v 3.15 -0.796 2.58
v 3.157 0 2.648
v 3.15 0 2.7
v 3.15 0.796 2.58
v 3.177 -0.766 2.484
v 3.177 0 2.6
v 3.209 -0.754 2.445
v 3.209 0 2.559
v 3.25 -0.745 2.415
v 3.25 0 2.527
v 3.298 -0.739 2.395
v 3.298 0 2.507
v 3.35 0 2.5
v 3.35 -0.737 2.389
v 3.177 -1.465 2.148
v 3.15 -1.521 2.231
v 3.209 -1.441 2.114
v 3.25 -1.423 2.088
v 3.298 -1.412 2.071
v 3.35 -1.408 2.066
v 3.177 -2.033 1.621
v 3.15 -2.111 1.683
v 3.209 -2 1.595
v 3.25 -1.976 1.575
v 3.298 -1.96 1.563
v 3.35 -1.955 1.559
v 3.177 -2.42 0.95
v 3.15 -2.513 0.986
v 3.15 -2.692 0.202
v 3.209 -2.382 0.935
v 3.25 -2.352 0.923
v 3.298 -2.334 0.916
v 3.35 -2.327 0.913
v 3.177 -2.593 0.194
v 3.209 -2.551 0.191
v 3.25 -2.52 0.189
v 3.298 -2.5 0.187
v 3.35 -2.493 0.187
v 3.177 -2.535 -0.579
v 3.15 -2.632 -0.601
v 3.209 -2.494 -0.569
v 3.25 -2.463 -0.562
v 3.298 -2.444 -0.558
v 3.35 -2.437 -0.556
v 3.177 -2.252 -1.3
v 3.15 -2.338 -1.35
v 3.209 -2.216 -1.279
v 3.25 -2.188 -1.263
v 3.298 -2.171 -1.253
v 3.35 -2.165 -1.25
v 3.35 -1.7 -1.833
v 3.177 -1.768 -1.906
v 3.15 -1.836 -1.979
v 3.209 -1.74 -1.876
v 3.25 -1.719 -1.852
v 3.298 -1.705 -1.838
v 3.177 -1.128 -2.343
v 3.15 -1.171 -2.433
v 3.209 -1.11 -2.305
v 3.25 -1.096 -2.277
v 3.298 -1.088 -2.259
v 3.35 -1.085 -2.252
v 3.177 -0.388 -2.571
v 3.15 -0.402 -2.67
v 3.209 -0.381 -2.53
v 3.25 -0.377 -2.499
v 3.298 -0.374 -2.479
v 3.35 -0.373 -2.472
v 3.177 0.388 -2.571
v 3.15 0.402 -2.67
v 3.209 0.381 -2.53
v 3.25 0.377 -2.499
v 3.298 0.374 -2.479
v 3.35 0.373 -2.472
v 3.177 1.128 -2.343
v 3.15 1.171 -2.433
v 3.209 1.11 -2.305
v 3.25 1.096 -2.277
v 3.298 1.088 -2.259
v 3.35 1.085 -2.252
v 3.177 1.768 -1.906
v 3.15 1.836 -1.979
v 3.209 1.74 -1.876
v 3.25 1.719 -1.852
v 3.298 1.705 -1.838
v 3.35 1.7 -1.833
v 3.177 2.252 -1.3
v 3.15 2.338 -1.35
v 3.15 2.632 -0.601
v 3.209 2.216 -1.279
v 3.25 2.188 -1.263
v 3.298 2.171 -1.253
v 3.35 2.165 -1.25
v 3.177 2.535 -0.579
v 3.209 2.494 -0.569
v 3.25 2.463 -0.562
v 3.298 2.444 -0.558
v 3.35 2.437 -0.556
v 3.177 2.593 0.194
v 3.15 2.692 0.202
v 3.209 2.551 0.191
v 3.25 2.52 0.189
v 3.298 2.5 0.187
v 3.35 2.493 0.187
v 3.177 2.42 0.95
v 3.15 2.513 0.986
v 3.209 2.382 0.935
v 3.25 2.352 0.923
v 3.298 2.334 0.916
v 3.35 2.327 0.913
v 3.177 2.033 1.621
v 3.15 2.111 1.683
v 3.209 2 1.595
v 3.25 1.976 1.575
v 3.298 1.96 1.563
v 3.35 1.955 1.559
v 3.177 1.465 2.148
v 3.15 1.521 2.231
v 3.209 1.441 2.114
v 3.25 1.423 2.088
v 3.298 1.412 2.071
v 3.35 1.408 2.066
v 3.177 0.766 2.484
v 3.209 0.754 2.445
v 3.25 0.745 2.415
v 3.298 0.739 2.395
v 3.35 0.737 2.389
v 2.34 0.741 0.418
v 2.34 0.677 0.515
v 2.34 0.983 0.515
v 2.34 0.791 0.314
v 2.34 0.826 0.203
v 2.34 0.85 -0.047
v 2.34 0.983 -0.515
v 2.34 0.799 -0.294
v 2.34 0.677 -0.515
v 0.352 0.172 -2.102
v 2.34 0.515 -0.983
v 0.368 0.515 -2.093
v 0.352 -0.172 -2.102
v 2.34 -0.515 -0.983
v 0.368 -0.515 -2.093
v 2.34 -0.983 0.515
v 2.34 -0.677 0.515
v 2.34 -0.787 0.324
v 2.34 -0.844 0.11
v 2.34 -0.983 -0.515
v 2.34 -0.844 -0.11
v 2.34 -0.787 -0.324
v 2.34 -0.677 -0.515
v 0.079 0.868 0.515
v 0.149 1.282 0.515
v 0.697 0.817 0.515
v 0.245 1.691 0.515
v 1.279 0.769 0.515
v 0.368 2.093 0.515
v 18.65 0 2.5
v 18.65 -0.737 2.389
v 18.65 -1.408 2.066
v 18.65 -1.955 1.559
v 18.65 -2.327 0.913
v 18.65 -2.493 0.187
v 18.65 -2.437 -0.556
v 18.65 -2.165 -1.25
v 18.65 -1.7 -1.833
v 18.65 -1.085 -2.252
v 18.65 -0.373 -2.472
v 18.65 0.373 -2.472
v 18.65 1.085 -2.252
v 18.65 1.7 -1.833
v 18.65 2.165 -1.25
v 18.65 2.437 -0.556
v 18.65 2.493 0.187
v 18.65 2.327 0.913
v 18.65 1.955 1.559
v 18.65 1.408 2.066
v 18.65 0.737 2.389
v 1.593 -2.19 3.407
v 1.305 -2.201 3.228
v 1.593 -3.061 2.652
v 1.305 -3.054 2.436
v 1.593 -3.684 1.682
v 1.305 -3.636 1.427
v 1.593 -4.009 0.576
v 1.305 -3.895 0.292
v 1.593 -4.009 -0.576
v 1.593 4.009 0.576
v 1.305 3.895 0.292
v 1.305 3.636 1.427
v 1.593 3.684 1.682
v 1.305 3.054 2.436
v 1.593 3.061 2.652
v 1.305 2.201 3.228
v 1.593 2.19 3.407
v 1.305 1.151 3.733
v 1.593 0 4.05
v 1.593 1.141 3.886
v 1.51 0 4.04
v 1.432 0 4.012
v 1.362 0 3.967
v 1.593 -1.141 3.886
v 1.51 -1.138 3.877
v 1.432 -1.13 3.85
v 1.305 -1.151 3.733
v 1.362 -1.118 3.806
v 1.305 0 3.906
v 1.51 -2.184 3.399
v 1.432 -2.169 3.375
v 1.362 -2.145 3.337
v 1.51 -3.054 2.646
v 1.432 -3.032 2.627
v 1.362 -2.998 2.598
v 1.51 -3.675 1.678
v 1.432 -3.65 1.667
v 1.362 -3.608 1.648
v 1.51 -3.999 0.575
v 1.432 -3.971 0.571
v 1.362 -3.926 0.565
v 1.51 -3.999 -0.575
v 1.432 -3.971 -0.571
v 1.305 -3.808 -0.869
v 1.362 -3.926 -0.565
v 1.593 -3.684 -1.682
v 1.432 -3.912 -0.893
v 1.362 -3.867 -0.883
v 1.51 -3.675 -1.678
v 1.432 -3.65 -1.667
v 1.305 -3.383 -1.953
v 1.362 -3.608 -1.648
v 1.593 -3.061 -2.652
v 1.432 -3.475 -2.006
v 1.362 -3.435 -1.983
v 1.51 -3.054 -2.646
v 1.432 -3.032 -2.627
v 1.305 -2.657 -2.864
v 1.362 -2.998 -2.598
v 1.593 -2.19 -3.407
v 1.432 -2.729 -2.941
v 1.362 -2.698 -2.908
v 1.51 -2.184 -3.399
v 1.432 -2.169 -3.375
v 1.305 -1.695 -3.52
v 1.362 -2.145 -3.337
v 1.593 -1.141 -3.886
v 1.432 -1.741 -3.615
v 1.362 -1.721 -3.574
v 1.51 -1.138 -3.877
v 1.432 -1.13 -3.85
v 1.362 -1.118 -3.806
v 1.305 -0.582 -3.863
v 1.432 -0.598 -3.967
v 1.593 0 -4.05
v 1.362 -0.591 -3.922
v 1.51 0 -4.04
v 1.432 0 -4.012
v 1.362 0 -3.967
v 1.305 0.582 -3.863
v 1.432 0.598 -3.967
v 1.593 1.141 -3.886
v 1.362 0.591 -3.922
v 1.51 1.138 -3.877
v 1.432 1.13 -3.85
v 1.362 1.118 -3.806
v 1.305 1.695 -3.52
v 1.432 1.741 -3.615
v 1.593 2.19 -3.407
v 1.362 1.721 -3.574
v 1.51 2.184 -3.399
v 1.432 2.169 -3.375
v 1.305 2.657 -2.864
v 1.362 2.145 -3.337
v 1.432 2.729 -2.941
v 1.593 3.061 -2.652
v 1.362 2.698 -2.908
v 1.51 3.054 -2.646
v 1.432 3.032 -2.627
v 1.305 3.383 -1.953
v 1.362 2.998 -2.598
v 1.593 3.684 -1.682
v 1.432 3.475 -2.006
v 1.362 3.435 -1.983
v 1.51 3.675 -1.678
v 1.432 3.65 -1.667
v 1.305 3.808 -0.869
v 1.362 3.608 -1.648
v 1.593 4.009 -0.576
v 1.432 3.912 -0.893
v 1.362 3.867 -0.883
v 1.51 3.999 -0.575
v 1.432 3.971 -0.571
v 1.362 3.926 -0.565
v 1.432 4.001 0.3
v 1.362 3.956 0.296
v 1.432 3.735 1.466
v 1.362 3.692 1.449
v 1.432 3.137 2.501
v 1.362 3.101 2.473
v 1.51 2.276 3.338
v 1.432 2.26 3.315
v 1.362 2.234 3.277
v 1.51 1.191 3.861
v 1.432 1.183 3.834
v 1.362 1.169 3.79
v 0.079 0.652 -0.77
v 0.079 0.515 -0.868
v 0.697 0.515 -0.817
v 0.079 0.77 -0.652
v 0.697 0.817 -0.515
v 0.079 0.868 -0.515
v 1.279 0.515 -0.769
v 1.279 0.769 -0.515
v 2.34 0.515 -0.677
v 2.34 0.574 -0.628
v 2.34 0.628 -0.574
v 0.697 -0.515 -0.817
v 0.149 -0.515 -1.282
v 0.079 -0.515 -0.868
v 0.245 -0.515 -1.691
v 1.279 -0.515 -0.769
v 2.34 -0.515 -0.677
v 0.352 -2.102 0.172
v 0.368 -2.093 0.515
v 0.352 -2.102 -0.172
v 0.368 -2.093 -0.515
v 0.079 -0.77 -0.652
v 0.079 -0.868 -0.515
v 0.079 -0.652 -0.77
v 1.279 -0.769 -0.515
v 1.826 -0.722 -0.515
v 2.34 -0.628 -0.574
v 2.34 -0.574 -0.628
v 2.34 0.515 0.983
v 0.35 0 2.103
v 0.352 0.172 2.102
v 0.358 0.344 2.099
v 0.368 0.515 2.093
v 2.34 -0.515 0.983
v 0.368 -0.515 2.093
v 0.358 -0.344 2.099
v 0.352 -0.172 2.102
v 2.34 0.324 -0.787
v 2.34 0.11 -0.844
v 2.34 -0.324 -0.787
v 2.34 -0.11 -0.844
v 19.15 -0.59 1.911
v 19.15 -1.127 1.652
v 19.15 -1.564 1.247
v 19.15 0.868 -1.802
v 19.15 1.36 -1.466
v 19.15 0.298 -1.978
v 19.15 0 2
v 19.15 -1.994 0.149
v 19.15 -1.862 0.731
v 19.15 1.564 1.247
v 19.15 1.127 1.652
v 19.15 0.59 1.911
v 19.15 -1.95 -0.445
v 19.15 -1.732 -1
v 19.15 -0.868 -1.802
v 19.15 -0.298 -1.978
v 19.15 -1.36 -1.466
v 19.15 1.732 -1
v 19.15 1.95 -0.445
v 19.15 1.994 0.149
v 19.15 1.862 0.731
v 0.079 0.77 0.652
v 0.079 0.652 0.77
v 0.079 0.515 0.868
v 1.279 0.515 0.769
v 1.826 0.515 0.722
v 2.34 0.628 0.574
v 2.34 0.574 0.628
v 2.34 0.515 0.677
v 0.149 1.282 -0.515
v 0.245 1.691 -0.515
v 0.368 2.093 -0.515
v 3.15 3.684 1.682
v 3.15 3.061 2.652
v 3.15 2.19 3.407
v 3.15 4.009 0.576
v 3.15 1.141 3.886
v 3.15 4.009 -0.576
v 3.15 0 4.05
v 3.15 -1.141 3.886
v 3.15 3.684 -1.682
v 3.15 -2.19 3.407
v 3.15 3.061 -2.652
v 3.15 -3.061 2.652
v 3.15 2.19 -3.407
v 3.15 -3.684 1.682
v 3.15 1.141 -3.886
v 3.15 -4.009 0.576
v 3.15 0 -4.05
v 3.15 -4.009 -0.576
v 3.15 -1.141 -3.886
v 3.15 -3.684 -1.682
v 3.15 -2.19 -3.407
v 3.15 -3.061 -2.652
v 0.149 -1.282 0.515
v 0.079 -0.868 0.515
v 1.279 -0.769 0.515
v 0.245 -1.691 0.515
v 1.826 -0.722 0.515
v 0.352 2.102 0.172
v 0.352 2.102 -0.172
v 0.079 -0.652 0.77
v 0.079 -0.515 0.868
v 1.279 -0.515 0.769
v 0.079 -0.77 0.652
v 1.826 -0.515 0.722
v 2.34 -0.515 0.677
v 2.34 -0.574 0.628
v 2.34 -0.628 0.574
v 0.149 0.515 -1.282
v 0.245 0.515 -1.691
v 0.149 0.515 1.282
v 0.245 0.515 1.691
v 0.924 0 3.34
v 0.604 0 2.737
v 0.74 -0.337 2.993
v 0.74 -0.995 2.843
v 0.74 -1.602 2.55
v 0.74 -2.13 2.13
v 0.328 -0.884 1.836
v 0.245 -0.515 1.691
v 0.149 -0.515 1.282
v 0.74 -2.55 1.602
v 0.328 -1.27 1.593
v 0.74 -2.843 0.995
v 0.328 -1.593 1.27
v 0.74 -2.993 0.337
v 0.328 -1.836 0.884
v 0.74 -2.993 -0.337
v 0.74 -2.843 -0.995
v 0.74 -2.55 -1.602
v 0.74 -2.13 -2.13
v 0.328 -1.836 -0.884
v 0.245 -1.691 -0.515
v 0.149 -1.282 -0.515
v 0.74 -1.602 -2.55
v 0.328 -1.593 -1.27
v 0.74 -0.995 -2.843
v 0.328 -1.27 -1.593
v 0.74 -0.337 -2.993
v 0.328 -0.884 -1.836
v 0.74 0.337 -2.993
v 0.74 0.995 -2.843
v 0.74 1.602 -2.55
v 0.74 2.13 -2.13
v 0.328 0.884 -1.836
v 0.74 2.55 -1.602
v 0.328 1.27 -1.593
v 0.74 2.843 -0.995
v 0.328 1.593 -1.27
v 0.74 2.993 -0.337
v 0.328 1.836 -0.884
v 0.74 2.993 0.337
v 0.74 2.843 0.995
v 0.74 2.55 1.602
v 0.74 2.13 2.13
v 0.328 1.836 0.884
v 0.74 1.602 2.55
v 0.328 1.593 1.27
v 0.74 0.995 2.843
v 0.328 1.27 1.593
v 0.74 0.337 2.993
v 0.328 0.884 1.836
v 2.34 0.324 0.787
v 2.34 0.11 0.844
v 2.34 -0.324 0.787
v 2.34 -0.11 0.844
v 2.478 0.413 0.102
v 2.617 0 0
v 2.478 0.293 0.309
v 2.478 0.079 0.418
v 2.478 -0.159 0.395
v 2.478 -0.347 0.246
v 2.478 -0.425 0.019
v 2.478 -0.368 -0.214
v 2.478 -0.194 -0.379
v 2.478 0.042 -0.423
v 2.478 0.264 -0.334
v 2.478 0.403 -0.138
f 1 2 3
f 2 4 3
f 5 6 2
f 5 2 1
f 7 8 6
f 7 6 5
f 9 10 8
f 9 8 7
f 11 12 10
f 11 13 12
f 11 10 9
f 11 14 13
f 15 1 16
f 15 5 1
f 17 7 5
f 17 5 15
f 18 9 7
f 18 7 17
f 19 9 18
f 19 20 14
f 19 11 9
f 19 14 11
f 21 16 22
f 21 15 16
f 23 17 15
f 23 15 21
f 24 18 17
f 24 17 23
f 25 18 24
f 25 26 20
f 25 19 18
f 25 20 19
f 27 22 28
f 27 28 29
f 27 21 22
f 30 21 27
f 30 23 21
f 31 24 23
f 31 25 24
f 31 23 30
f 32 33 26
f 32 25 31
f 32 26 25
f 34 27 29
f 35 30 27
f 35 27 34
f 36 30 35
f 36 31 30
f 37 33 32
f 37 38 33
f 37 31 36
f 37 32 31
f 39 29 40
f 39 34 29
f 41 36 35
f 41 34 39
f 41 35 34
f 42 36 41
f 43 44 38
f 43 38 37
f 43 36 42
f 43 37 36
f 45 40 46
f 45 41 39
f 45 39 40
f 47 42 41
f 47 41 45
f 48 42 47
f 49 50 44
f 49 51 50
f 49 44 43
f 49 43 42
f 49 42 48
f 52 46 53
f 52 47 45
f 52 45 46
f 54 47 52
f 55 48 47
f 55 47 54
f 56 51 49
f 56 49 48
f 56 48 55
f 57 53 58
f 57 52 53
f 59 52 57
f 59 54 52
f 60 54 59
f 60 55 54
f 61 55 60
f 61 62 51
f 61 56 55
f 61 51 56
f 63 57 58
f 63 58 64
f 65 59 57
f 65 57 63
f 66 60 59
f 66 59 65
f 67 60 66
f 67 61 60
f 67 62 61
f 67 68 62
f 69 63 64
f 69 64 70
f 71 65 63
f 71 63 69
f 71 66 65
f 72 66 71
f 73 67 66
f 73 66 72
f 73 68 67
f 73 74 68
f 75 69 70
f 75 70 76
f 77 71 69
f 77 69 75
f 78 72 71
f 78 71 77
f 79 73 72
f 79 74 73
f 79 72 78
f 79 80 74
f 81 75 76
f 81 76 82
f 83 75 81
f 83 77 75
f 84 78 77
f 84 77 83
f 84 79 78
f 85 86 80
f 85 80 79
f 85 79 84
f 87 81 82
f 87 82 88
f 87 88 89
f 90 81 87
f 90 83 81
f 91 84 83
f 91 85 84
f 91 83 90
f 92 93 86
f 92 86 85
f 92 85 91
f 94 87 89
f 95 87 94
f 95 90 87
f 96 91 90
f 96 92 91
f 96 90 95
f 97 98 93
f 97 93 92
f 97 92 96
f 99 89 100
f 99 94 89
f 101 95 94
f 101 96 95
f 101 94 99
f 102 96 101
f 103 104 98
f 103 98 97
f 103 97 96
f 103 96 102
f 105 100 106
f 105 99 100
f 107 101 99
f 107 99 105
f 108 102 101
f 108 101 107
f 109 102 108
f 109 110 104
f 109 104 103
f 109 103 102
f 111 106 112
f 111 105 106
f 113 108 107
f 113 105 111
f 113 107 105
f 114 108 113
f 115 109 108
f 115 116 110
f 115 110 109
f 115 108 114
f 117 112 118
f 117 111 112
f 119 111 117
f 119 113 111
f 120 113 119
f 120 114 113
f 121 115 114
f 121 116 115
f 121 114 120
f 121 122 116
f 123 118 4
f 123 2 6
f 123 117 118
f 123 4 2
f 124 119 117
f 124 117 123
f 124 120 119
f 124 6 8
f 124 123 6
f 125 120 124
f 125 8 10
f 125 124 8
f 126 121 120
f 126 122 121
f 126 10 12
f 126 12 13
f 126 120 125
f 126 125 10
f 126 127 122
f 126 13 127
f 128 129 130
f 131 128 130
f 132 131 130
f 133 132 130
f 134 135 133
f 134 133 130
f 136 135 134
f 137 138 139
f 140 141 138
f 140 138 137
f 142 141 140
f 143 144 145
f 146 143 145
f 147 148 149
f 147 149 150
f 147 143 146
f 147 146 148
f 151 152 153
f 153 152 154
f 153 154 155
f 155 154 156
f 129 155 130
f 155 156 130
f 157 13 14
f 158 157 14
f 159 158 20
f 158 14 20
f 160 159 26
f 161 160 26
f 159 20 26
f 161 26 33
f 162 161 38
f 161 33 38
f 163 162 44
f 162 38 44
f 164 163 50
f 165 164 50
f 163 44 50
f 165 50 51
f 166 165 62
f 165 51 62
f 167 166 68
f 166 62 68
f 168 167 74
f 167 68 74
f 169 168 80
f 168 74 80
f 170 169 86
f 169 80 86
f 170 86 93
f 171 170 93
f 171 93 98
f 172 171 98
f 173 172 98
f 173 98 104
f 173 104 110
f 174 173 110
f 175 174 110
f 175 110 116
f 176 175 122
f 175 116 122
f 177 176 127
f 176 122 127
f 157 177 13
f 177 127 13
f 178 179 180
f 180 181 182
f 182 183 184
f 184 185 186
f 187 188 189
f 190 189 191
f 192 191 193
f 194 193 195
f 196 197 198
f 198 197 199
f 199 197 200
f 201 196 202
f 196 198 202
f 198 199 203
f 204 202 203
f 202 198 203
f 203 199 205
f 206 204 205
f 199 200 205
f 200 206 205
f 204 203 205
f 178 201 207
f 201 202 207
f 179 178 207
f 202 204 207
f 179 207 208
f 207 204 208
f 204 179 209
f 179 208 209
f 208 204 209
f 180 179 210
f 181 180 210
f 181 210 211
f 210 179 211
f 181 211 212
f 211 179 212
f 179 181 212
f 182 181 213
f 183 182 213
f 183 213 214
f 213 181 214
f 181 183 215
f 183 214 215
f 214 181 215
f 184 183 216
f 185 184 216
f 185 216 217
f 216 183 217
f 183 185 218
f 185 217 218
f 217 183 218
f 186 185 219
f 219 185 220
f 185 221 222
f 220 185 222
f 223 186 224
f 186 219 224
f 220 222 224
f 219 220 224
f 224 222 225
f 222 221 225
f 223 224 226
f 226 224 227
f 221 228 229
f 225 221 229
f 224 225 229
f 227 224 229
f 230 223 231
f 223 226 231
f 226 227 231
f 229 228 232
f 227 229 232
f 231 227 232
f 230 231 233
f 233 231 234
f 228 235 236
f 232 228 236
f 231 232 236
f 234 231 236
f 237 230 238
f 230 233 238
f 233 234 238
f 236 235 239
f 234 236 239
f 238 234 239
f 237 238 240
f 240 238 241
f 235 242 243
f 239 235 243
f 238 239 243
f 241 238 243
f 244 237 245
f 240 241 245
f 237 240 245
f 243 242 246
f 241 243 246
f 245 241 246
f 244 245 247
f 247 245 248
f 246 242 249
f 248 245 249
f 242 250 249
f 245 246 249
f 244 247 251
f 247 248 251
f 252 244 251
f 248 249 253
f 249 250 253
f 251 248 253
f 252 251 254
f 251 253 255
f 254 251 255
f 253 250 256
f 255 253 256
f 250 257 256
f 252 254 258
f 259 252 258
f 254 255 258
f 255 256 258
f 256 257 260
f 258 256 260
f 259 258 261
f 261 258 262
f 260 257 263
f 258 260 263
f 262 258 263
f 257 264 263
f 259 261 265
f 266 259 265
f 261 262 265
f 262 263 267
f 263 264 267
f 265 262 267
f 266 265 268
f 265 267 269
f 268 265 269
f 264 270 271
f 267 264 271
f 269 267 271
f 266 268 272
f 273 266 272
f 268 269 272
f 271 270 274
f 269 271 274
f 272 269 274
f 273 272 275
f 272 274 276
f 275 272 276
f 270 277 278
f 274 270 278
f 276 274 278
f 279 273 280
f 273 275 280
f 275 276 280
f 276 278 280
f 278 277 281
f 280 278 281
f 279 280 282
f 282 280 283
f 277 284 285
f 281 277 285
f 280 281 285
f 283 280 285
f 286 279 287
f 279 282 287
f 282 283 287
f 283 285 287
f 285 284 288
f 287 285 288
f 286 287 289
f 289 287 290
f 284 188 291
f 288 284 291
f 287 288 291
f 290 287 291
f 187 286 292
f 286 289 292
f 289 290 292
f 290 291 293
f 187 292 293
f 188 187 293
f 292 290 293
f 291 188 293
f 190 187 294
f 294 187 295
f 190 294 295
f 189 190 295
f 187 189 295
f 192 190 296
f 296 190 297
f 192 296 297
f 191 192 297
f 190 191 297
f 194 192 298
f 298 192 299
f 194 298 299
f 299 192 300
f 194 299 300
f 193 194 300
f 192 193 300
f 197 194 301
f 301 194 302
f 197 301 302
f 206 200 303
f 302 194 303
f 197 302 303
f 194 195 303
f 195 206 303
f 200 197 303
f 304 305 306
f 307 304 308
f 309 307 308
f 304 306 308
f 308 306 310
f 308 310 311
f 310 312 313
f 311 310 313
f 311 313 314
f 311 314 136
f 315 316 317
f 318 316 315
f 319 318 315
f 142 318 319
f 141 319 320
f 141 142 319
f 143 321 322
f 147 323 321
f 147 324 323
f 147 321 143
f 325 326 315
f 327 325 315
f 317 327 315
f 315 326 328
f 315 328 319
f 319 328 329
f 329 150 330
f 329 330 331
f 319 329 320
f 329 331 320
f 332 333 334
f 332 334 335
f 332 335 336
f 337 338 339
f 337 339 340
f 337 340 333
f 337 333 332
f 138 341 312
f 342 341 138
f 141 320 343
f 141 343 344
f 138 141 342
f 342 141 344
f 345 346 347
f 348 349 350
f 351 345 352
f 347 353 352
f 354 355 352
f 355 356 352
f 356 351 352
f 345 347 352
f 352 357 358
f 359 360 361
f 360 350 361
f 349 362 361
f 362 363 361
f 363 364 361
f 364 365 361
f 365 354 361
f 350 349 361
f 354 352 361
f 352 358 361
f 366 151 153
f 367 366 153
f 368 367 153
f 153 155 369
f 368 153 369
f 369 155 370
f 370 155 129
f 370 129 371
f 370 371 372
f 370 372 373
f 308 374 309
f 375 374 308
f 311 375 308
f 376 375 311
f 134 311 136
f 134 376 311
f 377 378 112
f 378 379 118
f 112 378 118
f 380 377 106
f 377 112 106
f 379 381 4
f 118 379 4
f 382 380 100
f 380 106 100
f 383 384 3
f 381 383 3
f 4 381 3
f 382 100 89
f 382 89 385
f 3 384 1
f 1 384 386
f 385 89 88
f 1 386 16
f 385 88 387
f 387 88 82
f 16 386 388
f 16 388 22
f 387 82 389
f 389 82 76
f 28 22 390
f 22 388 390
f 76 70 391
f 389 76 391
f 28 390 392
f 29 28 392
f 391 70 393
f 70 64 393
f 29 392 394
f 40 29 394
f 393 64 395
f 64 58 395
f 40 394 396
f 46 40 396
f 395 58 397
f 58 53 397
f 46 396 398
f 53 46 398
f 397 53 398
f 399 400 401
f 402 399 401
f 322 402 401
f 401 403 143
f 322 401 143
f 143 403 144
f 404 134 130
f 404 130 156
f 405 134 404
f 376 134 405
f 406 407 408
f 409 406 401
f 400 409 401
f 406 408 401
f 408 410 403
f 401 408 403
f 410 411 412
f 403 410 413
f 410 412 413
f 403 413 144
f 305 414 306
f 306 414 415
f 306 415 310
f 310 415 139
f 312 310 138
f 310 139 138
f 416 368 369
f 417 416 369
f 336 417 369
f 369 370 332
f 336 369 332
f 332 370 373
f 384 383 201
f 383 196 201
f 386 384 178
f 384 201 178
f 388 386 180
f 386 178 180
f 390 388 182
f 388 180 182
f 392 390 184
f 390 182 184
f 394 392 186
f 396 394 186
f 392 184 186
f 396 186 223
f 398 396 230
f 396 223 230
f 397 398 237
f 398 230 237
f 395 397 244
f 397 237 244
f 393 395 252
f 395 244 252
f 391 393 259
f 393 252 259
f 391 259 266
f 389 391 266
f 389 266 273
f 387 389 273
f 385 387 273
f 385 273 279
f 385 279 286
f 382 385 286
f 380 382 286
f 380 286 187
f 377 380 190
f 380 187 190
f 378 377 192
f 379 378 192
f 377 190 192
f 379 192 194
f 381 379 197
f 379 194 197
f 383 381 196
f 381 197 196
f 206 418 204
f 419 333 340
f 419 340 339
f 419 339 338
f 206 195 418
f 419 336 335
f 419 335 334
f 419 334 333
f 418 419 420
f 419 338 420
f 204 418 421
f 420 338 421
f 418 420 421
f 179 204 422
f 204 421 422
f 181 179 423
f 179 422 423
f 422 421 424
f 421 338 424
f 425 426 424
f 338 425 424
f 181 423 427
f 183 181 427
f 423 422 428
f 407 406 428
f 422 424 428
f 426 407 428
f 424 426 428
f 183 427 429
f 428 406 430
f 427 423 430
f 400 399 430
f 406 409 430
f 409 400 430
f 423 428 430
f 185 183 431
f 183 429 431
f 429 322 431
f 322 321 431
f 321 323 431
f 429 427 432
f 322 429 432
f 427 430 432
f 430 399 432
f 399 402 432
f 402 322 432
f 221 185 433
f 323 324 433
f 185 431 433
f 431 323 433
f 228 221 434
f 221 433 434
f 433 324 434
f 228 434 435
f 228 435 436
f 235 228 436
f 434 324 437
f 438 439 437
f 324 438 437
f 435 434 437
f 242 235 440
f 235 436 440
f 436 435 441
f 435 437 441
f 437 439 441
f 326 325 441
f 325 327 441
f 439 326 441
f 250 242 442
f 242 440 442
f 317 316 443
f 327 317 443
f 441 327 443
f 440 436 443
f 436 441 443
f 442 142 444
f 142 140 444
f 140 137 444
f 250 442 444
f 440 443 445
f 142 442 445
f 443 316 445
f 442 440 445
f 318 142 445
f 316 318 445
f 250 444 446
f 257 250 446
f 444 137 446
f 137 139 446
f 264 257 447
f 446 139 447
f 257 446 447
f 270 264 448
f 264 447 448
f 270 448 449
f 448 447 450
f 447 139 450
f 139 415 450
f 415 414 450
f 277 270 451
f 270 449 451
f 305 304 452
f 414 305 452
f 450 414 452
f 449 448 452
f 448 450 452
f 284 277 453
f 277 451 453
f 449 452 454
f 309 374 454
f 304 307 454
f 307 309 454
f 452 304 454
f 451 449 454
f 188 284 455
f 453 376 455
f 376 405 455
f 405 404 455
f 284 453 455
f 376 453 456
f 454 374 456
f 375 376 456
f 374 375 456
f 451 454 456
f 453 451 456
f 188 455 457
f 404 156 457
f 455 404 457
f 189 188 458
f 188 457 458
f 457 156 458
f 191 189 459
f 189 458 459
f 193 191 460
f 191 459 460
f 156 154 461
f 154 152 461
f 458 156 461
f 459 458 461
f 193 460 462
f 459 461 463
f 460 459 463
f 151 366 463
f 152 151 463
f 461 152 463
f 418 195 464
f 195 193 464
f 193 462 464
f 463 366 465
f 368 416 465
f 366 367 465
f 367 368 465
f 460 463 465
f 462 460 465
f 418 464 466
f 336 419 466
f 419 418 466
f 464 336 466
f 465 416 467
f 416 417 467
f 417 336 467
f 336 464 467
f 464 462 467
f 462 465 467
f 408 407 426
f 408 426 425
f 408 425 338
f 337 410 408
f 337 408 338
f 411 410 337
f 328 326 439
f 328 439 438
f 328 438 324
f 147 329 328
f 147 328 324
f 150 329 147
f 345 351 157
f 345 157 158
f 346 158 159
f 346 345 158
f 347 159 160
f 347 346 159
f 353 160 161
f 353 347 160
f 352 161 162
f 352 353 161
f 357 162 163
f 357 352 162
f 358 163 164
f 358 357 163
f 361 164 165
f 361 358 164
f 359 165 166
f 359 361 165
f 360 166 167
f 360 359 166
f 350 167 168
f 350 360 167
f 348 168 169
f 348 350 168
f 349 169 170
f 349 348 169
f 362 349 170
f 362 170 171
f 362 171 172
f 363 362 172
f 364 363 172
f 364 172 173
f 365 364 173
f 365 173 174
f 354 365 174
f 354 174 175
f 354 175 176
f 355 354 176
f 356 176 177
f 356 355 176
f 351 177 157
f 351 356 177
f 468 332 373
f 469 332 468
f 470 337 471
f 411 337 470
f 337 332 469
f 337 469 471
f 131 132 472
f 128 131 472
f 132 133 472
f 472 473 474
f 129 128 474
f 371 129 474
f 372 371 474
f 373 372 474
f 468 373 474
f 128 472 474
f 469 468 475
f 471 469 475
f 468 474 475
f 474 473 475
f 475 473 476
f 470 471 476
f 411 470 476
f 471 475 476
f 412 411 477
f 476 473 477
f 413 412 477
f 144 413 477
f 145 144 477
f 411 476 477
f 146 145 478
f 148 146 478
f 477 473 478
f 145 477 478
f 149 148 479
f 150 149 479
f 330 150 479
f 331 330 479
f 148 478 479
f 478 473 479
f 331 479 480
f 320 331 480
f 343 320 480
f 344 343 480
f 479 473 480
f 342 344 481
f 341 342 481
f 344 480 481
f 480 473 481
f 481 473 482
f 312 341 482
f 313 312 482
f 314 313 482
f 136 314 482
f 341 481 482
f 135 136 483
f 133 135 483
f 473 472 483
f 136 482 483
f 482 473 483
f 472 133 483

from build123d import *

# Parameters (mm, degrees)
CONG_1_R                             = 0.2
ENL_VEMENT_START                     = -0.515
ENL_VEMENT_DE_MATI_RE_LISSAGE1_DEPTH = 1.03
R_P_TITION_CIRCULAIRE1_COUNT         = 2
R_P_TITION_CIRCULAIRE1_ANGLE         = 90
CHANFREIN1_SIZE                      = 0.5


# Read off the part's stored shape, not the designer's step: Enlèvement de matière-Lissage1
with BuildPart() as part:
    # Esquisse1 → Révolution1 (revolve)
    with BuildSketch(Plane.XY, mode=Mode.PRIVATE) as r_volution1_sk:
        with BuildLine():
            Line((3.15, 2.5), (3.15, 4.05))
            Line((3.15, 4.05), (1.592505731, 4.05))
            ThreePointArc((1.592505731, 4.05), (1.431705614, 4.012092102), (1.304769911, 3.906351792))
            ThreePointArc((1.304769911, 3.906351792), (0.334815673, 2.059247972), (0, 0))
            Line((0, 0), (19.15, 0))
            Line((19.15, 0), (19.15, 2.5))
            Line((19.15, 2.5), (3.15, 2.5))
        make_face()
    revolve(r_volution1_sk.sketch.rotate(Axis((-25.4, 0, 0), (1, 0, 0)), 90), axis=Axis((-25.4, 0, 0), (1, 0, 0)))

    # Congé1
    cong_1_edges = [part.edges().sort_by_distance(p)[0] for p in [
        (3.15, 0, -2.5),
    ]]
    fillet(cong_1_edges, radius=CONG_1_R)

    # Enlèvement de matière-Lissage1 outline → Enlèvement de matière-Lissage1 (cut)
    with BuildSketch(Plane.XY.offset(ENL_VEMENT_START)):
        Polygon((2.34, -0.983319232), (2.34, 0.983319232), (0.349683815, 2.103238481), (-1, 2.862684089), (-1, -2.862684089), (0.349683815, -2.103238481), align=None)
    enl_vement_de_mati_re_lissage1 = extrude(amount=ENL_VEMENT_DE_MATI_RE_LISSAGE1_DEPTH, mode=Mode.SUBTRACT)

    # Répétition circulaire1: Enlèvement de matière-Lissage1 ×2 about axis
    r_p_tition_circulaire1_axis = Axis((0, 0, 0), (-1, 0, 0))
    for i in range(1, R_P_TITION_CIRCULAIRE1_COUNT):
        add(enl_vement_de_mati_re_lissage1.rotate(r_p_tition_circulaire1_axis, i * R_P_TITION_CIRCULAIRE1_ANGLE / (R_P_TITION_CIRCULAIRE1_COUNT - 1)), mode=Mode.SUBTRACT)

    # Esquisse4 → Enlèvement de matière-Révolution1 (revolve, cut)
    with BuildSketch(Plane.XY, mode=Mode.PRIVATE) as enl_vement_de_mati_re_r_volution1_sk:
        Polygon((0, 0), (0, 1.01462874), (2.34, 0.851), (2.616506661, 0), align=None)
    revolve(enl_vement_de_mati_re_r_volution1_sk.sketch.rotate(Axis((-3.175, 0, 0), (1, 0, 0)), 13.8231891), axis=Axis((-3.175, 0, 0), (1, 0, 0)), mode=Mode.SUBTRACT)

    # Chanfrein1
    chanfrein1_edges = [part.edges().sort_by_distance(p)[0] for p in [
        (19.15, 0, -2.5),
    ]]
    chamfer(chanfrein1_edges, length=CHANFREIN1_SIZE)


solid = part.part
